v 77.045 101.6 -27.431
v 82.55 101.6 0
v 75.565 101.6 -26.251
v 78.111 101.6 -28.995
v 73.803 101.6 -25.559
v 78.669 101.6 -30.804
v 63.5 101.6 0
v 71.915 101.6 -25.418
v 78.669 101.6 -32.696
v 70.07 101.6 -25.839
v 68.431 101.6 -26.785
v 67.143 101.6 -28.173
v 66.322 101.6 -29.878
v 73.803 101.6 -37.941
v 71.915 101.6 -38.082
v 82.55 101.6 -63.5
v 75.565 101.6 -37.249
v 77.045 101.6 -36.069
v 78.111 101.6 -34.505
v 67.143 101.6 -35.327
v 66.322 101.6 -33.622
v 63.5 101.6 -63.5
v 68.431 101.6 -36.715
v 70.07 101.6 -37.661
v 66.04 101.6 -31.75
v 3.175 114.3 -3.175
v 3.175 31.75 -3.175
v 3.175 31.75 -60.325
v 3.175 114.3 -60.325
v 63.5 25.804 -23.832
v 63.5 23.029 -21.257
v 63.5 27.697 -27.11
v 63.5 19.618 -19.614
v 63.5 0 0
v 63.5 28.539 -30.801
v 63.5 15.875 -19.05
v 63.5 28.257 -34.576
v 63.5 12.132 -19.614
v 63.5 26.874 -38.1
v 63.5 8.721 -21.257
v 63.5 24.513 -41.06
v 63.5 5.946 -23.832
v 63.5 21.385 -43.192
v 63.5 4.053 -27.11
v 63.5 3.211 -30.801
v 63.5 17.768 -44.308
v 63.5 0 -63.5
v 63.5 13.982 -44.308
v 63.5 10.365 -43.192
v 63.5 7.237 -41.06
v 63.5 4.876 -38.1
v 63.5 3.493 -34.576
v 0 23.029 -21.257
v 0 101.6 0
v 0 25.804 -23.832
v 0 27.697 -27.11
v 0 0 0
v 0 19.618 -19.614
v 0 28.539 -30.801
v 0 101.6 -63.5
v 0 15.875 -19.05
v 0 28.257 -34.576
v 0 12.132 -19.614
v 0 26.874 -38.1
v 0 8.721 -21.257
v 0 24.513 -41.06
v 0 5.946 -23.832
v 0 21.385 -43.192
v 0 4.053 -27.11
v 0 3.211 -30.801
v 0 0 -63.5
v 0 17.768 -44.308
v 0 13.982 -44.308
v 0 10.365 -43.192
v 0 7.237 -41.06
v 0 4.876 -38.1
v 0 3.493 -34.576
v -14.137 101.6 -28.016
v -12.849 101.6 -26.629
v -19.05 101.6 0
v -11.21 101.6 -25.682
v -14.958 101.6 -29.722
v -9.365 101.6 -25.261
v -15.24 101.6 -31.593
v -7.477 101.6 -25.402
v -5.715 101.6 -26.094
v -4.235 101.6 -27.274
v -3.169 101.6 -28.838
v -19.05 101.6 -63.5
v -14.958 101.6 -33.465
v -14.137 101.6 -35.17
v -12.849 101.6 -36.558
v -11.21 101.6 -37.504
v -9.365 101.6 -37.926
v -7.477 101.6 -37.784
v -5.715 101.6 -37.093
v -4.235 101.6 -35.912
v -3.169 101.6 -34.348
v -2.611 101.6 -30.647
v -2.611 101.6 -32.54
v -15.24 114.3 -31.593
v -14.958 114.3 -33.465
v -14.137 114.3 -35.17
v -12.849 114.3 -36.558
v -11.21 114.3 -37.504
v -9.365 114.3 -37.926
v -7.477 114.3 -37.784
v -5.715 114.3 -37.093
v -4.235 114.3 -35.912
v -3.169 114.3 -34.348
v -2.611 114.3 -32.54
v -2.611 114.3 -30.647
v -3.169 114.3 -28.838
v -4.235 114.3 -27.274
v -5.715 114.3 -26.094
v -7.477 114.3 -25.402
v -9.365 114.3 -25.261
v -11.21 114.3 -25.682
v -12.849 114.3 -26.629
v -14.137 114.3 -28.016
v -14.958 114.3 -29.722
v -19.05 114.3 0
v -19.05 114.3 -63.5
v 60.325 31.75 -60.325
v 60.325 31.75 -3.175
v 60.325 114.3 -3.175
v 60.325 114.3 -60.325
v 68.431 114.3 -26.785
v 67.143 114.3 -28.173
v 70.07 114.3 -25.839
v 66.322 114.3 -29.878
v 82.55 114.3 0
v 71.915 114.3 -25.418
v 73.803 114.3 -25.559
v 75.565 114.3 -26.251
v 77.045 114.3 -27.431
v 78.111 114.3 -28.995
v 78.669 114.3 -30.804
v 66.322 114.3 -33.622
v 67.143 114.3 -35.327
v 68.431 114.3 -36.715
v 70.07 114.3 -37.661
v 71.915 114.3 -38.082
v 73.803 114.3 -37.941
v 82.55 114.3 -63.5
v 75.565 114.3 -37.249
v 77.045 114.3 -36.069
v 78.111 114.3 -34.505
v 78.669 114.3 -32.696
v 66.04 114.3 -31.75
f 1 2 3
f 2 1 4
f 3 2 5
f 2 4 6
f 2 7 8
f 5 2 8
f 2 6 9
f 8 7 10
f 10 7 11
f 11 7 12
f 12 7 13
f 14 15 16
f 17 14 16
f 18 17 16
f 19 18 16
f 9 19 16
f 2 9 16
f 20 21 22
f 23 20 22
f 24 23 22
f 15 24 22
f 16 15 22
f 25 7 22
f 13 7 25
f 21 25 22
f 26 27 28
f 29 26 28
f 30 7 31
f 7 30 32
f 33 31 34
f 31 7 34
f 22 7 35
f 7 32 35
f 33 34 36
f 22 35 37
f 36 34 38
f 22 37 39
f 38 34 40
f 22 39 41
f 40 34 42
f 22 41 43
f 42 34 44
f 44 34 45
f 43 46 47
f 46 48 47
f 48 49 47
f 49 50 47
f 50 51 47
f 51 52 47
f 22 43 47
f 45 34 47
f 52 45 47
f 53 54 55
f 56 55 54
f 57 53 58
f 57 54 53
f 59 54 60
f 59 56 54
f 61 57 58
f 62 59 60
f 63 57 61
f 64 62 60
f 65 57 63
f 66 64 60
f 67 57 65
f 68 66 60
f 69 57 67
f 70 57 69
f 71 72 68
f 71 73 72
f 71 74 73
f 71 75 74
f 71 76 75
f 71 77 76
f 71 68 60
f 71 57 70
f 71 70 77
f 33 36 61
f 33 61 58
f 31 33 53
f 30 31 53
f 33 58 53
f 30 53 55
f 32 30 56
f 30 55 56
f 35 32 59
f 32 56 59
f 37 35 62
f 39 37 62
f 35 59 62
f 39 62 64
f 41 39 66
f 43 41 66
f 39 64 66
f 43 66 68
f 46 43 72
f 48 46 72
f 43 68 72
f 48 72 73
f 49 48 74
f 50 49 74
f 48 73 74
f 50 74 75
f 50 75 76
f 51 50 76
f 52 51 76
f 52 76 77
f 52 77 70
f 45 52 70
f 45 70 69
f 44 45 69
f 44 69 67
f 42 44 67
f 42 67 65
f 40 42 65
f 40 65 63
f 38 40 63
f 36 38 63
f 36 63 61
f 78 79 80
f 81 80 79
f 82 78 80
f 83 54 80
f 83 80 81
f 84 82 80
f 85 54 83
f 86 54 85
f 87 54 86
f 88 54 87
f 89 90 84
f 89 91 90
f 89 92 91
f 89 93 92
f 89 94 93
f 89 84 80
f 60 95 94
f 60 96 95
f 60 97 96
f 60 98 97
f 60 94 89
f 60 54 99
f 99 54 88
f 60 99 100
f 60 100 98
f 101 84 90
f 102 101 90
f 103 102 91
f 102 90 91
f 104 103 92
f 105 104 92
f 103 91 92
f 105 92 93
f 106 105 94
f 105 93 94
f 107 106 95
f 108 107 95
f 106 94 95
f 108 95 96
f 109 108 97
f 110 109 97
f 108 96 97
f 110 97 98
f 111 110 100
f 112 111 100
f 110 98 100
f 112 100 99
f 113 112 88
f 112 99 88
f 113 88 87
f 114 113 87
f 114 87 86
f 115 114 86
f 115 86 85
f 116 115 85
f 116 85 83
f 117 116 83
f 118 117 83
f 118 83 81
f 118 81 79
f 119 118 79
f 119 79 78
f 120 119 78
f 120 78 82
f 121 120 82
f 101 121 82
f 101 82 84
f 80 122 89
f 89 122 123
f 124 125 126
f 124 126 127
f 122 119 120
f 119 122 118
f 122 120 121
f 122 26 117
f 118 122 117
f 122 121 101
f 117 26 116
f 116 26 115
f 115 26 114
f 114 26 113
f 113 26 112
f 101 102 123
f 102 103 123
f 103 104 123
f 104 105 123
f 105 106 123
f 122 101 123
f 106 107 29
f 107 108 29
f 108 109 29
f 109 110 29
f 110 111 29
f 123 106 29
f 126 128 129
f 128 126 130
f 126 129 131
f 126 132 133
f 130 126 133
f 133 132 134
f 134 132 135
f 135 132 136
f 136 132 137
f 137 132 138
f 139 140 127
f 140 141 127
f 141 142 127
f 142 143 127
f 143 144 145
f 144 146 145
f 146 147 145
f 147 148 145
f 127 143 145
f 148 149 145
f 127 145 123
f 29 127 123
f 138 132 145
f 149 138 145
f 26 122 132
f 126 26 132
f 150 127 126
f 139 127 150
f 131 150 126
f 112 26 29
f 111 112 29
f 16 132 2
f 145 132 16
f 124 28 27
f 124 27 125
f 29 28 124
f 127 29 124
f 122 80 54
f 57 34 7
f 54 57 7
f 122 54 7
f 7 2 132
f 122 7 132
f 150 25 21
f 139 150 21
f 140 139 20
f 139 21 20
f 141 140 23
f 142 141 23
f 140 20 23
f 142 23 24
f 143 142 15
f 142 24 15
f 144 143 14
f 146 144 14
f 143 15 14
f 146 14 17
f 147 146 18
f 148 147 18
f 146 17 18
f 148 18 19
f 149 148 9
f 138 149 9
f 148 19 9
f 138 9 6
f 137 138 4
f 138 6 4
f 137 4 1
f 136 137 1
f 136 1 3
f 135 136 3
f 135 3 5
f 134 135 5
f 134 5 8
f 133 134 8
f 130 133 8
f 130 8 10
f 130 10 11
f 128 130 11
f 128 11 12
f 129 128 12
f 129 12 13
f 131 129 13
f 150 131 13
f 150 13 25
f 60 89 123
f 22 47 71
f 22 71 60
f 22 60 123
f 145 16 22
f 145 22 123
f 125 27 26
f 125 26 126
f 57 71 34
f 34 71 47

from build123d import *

# Parameters (mm, degrees)
SKETCH1_W                      = 63.5
SKETCH1_H                      = 63.5
BOSS_EXTRUDE1_DEPTH            = 31.75
SKETCH2_W                      = 63.5
SKETCH2_H                      = 63.5
SKETCH2_W_2                    = 57.15
SKETCH2_H_2                    = 57.15
BOSS_EXTRUDE2_DEPTH            = 82.55
SKETCH3_W                      = 63.5
SKETCH3_H                      = 12.7
BOSS_EXTRUDE3_DEPTH            = 19.05
F_1_1_DIAMETER_HOLE2_D         = 25.4
F_1_1_DIAMETER_HOLE2_DEPTH     = 63.5
F_1_2_0_5_DIAMETER_HOLE1_D     = 12.7
F_1_2_0_5_DIAMETER_HOLE1_DEPTH = 12.7


with BuildPart() as part:
    # Sketch1 → Boss-Extrude1 (new body)
    with BuildSketch(Plane(origin=(0, 0, 0), x_dir=(1, 0, 0), z_dir=(0, 1, 0))):
        with Locations((31.75, 31.75)):
            Rectangle(SKETCH1_W, SKETCH1_H)
    extrude(amount=BOSS_EXTRUDE1_DEPTH)

    # Sketch2 → Boss-Extrude2 (add)
    with BuildSketch(Plane(origin=(0, 31.75, 0), x_dir=(1, 0, 0), z_dir=(0, 1, 0))):
        with Locations((31.75, 31.75)):
            Rectangle(SKETCH2_W, SKETCH2_H)
        with Locations((31.75, 31.75)):
            Rectangle(SKETCH2_W_2, SKETCH2_H_2, mode=Mode.SUBTRACT)
    extrude(amount=BOSS_EXTRUDE2_DEPTH)

    # Sketch3 → Boss-Extrude3 (add)
    with BuildSketch(Plane(origin=(63.5, 0, 0), x_dir=(0, 0, -1), z_dir=(1, 0, 0))):
        with Locations((31.75, 107.95)):
            Rectangle(SKETCH3_W, SKETCH3_H)
    boss_extrude3 = extrude(amount=BOSS_EXTRUDE3_DEPTH)

    # Mirror2: Boss-Extrude3 across plane
    add(boss_extrude3.mirror(Plane(origin=(31.75, 0, 0), x_dir=(0, 0, 1), z_dir=(1, 0, 0))))

    # 1 (1) Diameter Hole2
    with Locations(Plane(origin=(63.5, 0, 0), x_dir=(0, 0, -1), z_dir=(1, 0, 0))):
        with Locations((31.75, 15.875)):
            Hole(F_1_1_DIAMETER_HOLE2_D / 2, depth=F_1_1_DIAMETER_HOLE2_DEPTH)

    # 1/2 (0.5) Diameter Hole1
    with Locations(Plane(origin=(0, 114.3, 0), x_dir=(1, 0, 0), z_dir=(0, 1, 0))):
        with Locations((72.39, 31.75), (-8.89, 31.593283178)):
            Hole(F_1_2_0_5_DIAMETER_HOLE1_D / 2, depth=F_1_2_0_5_DIAMETER_HOLE1_DEPTH)


solid = part.part
